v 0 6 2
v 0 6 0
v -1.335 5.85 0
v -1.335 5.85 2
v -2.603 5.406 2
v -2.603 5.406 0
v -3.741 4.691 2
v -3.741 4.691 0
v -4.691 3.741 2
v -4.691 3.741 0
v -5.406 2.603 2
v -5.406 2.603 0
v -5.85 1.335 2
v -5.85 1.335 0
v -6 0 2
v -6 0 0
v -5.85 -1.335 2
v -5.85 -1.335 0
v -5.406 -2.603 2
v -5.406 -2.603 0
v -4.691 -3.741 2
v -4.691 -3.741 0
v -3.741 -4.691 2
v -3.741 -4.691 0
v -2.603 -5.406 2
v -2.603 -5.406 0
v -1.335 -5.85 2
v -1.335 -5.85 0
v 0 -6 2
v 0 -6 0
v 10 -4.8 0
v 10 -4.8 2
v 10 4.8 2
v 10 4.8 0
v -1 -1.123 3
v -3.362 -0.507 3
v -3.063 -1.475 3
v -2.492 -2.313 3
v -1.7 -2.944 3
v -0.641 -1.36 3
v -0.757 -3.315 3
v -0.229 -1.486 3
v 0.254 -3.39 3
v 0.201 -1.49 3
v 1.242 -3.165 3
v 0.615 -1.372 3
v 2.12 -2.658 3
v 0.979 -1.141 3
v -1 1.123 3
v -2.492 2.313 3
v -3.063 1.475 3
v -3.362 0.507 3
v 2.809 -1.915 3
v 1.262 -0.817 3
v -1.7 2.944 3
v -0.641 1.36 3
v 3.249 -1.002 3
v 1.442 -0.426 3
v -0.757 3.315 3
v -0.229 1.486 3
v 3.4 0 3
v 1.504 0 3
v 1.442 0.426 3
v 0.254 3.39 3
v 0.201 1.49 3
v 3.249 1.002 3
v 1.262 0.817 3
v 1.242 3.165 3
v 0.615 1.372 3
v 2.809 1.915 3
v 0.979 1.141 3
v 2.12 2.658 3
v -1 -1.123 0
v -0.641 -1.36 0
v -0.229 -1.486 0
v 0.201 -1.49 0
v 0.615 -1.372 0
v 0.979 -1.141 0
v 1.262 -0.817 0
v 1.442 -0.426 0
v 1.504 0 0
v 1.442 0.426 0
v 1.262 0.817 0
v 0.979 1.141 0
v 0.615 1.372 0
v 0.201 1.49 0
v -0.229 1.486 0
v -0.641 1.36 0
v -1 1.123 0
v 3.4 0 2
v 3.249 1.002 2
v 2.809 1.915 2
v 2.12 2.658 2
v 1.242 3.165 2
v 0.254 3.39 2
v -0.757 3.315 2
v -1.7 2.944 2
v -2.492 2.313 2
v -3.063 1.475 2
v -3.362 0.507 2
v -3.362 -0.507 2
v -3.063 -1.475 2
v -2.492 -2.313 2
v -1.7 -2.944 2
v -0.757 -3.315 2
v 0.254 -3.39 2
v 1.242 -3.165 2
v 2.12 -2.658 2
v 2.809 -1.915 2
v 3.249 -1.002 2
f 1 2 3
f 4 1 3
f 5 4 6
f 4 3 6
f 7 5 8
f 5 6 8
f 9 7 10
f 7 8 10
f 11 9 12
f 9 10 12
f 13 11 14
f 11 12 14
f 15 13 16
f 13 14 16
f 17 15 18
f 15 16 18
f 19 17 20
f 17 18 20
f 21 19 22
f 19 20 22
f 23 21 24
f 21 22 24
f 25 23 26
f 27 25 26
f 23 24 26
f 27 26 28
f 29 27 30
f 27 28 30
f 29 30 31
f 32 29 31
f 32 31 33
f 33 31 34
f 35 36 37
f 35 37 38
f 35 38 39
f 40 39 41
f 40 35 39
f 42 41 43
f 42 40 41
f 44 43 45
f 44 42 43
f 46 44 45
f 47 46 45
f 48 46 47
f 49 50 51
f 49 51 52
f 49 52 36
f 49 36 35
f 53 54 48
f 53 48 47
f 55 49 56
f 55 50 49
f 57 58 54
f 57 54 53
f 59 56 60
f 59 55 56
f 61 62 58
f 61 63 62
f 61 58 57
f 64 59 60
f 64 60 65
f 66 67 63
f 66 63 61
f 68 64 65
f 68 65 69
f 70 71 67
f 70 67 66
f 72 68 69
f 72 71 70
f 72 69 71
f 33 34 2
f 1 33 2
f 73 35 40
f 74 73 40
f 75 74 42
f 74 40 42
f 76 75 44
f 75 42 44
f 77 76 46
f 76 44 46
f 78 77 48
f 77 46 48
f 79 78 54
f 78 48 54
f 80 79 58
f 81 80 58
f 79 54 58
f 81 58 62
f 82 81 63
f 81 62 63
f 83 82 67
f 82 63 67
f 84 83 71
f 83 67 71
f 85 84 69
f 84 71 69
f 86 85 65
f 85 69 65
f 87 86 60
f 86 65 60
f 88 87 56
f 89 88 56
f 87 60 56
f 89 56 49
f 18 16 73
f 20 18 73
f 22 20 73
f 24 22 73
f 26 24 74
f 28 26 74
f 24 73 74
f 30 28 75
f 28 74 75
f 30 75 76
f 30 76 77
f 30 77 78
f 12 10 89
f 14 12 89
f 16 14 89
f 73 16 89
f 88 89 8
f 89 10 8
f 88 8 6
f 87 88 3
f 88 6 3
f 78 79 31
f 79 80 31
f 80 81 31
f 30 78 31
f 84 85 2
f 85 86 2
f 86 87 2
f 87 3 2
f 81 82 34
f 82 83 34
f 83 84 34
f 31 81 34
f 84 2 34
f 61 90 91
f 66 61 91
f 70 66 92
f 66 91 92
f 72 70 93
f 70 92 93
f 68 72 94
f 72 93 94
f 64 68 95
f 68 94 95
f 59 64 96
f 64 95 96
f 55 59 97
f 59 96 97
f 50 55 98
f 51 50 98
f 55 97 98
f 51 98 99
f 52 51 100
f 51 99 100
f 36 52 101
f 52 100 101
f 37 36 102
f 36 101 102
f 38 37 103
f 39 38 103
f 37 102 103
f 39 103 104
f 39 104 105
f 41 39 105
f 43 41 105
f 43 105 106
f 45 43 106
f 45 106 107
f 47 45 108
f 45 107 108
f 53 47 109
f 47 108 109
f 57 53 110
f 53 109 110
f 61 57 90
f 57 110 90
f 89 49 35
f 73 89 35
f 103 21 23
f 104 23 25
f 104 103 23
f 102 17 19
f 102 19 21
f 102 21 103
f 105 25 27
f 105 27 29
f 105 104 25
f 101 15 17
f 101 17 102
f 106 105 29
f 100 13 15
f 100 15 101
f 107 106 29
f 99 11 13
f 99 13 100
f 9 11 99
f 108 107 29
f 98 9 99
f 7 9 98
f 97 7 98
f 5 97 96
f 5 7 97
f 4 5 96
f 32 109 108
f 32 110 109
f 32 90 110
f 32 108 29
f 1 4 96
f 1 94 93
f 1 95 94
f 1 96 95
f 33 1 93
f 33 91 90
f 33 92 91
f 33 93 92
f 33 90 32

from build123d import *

# Parameters (mm, degrees)
BOSS_EXTRUDE1_DEPTH = 2
SKETCH7_R           = 3.4
BOSS_EXTRUDE2_DEPTH = 1
CUT_EXTRUDE3_DEPTH  = 4


with BuildPart() as part:
    # Sketch2 → Boss-Extrude1 (new body)
    with BuildSketch(Plane.XY):
        with BuildLine():
            Line((10, -4.8), (10, 4.8))
            Line((10, 4.8), (0, 6))
            ThreePointArc((0, 6), (-6, 0), (0, -6))
            Line((0, -6), (10, -4.8))
        make_face()
    extrude(amount=BOSS_EXTRUDE1_DEPTH)

    # Sketch7 → Boss-Extrude2 (add)
    with BuildSketch(Plane.XY.offset(2)):
        Circle(SKETCH7_R)
    extrude(amount=BOSS_EXTRUDE2_DEPTH)

    # Sketch8 → Cut-Extrude3 (cut, through all)
    with BuildSketch(Plane.XY.offset(3)):
        with BuildLine():
            Line((-1, 1.122930178), (-1, -1.122930178))
            ThreePointArc((-1, -1.122930178), (1.503652947, 0), (-1, 1.122930178))
        make_face()
    extrude(amount=-CUT_EXTRUDE3_DEPTH, mode=Mode.SUBTRACT)


solid = part.part
